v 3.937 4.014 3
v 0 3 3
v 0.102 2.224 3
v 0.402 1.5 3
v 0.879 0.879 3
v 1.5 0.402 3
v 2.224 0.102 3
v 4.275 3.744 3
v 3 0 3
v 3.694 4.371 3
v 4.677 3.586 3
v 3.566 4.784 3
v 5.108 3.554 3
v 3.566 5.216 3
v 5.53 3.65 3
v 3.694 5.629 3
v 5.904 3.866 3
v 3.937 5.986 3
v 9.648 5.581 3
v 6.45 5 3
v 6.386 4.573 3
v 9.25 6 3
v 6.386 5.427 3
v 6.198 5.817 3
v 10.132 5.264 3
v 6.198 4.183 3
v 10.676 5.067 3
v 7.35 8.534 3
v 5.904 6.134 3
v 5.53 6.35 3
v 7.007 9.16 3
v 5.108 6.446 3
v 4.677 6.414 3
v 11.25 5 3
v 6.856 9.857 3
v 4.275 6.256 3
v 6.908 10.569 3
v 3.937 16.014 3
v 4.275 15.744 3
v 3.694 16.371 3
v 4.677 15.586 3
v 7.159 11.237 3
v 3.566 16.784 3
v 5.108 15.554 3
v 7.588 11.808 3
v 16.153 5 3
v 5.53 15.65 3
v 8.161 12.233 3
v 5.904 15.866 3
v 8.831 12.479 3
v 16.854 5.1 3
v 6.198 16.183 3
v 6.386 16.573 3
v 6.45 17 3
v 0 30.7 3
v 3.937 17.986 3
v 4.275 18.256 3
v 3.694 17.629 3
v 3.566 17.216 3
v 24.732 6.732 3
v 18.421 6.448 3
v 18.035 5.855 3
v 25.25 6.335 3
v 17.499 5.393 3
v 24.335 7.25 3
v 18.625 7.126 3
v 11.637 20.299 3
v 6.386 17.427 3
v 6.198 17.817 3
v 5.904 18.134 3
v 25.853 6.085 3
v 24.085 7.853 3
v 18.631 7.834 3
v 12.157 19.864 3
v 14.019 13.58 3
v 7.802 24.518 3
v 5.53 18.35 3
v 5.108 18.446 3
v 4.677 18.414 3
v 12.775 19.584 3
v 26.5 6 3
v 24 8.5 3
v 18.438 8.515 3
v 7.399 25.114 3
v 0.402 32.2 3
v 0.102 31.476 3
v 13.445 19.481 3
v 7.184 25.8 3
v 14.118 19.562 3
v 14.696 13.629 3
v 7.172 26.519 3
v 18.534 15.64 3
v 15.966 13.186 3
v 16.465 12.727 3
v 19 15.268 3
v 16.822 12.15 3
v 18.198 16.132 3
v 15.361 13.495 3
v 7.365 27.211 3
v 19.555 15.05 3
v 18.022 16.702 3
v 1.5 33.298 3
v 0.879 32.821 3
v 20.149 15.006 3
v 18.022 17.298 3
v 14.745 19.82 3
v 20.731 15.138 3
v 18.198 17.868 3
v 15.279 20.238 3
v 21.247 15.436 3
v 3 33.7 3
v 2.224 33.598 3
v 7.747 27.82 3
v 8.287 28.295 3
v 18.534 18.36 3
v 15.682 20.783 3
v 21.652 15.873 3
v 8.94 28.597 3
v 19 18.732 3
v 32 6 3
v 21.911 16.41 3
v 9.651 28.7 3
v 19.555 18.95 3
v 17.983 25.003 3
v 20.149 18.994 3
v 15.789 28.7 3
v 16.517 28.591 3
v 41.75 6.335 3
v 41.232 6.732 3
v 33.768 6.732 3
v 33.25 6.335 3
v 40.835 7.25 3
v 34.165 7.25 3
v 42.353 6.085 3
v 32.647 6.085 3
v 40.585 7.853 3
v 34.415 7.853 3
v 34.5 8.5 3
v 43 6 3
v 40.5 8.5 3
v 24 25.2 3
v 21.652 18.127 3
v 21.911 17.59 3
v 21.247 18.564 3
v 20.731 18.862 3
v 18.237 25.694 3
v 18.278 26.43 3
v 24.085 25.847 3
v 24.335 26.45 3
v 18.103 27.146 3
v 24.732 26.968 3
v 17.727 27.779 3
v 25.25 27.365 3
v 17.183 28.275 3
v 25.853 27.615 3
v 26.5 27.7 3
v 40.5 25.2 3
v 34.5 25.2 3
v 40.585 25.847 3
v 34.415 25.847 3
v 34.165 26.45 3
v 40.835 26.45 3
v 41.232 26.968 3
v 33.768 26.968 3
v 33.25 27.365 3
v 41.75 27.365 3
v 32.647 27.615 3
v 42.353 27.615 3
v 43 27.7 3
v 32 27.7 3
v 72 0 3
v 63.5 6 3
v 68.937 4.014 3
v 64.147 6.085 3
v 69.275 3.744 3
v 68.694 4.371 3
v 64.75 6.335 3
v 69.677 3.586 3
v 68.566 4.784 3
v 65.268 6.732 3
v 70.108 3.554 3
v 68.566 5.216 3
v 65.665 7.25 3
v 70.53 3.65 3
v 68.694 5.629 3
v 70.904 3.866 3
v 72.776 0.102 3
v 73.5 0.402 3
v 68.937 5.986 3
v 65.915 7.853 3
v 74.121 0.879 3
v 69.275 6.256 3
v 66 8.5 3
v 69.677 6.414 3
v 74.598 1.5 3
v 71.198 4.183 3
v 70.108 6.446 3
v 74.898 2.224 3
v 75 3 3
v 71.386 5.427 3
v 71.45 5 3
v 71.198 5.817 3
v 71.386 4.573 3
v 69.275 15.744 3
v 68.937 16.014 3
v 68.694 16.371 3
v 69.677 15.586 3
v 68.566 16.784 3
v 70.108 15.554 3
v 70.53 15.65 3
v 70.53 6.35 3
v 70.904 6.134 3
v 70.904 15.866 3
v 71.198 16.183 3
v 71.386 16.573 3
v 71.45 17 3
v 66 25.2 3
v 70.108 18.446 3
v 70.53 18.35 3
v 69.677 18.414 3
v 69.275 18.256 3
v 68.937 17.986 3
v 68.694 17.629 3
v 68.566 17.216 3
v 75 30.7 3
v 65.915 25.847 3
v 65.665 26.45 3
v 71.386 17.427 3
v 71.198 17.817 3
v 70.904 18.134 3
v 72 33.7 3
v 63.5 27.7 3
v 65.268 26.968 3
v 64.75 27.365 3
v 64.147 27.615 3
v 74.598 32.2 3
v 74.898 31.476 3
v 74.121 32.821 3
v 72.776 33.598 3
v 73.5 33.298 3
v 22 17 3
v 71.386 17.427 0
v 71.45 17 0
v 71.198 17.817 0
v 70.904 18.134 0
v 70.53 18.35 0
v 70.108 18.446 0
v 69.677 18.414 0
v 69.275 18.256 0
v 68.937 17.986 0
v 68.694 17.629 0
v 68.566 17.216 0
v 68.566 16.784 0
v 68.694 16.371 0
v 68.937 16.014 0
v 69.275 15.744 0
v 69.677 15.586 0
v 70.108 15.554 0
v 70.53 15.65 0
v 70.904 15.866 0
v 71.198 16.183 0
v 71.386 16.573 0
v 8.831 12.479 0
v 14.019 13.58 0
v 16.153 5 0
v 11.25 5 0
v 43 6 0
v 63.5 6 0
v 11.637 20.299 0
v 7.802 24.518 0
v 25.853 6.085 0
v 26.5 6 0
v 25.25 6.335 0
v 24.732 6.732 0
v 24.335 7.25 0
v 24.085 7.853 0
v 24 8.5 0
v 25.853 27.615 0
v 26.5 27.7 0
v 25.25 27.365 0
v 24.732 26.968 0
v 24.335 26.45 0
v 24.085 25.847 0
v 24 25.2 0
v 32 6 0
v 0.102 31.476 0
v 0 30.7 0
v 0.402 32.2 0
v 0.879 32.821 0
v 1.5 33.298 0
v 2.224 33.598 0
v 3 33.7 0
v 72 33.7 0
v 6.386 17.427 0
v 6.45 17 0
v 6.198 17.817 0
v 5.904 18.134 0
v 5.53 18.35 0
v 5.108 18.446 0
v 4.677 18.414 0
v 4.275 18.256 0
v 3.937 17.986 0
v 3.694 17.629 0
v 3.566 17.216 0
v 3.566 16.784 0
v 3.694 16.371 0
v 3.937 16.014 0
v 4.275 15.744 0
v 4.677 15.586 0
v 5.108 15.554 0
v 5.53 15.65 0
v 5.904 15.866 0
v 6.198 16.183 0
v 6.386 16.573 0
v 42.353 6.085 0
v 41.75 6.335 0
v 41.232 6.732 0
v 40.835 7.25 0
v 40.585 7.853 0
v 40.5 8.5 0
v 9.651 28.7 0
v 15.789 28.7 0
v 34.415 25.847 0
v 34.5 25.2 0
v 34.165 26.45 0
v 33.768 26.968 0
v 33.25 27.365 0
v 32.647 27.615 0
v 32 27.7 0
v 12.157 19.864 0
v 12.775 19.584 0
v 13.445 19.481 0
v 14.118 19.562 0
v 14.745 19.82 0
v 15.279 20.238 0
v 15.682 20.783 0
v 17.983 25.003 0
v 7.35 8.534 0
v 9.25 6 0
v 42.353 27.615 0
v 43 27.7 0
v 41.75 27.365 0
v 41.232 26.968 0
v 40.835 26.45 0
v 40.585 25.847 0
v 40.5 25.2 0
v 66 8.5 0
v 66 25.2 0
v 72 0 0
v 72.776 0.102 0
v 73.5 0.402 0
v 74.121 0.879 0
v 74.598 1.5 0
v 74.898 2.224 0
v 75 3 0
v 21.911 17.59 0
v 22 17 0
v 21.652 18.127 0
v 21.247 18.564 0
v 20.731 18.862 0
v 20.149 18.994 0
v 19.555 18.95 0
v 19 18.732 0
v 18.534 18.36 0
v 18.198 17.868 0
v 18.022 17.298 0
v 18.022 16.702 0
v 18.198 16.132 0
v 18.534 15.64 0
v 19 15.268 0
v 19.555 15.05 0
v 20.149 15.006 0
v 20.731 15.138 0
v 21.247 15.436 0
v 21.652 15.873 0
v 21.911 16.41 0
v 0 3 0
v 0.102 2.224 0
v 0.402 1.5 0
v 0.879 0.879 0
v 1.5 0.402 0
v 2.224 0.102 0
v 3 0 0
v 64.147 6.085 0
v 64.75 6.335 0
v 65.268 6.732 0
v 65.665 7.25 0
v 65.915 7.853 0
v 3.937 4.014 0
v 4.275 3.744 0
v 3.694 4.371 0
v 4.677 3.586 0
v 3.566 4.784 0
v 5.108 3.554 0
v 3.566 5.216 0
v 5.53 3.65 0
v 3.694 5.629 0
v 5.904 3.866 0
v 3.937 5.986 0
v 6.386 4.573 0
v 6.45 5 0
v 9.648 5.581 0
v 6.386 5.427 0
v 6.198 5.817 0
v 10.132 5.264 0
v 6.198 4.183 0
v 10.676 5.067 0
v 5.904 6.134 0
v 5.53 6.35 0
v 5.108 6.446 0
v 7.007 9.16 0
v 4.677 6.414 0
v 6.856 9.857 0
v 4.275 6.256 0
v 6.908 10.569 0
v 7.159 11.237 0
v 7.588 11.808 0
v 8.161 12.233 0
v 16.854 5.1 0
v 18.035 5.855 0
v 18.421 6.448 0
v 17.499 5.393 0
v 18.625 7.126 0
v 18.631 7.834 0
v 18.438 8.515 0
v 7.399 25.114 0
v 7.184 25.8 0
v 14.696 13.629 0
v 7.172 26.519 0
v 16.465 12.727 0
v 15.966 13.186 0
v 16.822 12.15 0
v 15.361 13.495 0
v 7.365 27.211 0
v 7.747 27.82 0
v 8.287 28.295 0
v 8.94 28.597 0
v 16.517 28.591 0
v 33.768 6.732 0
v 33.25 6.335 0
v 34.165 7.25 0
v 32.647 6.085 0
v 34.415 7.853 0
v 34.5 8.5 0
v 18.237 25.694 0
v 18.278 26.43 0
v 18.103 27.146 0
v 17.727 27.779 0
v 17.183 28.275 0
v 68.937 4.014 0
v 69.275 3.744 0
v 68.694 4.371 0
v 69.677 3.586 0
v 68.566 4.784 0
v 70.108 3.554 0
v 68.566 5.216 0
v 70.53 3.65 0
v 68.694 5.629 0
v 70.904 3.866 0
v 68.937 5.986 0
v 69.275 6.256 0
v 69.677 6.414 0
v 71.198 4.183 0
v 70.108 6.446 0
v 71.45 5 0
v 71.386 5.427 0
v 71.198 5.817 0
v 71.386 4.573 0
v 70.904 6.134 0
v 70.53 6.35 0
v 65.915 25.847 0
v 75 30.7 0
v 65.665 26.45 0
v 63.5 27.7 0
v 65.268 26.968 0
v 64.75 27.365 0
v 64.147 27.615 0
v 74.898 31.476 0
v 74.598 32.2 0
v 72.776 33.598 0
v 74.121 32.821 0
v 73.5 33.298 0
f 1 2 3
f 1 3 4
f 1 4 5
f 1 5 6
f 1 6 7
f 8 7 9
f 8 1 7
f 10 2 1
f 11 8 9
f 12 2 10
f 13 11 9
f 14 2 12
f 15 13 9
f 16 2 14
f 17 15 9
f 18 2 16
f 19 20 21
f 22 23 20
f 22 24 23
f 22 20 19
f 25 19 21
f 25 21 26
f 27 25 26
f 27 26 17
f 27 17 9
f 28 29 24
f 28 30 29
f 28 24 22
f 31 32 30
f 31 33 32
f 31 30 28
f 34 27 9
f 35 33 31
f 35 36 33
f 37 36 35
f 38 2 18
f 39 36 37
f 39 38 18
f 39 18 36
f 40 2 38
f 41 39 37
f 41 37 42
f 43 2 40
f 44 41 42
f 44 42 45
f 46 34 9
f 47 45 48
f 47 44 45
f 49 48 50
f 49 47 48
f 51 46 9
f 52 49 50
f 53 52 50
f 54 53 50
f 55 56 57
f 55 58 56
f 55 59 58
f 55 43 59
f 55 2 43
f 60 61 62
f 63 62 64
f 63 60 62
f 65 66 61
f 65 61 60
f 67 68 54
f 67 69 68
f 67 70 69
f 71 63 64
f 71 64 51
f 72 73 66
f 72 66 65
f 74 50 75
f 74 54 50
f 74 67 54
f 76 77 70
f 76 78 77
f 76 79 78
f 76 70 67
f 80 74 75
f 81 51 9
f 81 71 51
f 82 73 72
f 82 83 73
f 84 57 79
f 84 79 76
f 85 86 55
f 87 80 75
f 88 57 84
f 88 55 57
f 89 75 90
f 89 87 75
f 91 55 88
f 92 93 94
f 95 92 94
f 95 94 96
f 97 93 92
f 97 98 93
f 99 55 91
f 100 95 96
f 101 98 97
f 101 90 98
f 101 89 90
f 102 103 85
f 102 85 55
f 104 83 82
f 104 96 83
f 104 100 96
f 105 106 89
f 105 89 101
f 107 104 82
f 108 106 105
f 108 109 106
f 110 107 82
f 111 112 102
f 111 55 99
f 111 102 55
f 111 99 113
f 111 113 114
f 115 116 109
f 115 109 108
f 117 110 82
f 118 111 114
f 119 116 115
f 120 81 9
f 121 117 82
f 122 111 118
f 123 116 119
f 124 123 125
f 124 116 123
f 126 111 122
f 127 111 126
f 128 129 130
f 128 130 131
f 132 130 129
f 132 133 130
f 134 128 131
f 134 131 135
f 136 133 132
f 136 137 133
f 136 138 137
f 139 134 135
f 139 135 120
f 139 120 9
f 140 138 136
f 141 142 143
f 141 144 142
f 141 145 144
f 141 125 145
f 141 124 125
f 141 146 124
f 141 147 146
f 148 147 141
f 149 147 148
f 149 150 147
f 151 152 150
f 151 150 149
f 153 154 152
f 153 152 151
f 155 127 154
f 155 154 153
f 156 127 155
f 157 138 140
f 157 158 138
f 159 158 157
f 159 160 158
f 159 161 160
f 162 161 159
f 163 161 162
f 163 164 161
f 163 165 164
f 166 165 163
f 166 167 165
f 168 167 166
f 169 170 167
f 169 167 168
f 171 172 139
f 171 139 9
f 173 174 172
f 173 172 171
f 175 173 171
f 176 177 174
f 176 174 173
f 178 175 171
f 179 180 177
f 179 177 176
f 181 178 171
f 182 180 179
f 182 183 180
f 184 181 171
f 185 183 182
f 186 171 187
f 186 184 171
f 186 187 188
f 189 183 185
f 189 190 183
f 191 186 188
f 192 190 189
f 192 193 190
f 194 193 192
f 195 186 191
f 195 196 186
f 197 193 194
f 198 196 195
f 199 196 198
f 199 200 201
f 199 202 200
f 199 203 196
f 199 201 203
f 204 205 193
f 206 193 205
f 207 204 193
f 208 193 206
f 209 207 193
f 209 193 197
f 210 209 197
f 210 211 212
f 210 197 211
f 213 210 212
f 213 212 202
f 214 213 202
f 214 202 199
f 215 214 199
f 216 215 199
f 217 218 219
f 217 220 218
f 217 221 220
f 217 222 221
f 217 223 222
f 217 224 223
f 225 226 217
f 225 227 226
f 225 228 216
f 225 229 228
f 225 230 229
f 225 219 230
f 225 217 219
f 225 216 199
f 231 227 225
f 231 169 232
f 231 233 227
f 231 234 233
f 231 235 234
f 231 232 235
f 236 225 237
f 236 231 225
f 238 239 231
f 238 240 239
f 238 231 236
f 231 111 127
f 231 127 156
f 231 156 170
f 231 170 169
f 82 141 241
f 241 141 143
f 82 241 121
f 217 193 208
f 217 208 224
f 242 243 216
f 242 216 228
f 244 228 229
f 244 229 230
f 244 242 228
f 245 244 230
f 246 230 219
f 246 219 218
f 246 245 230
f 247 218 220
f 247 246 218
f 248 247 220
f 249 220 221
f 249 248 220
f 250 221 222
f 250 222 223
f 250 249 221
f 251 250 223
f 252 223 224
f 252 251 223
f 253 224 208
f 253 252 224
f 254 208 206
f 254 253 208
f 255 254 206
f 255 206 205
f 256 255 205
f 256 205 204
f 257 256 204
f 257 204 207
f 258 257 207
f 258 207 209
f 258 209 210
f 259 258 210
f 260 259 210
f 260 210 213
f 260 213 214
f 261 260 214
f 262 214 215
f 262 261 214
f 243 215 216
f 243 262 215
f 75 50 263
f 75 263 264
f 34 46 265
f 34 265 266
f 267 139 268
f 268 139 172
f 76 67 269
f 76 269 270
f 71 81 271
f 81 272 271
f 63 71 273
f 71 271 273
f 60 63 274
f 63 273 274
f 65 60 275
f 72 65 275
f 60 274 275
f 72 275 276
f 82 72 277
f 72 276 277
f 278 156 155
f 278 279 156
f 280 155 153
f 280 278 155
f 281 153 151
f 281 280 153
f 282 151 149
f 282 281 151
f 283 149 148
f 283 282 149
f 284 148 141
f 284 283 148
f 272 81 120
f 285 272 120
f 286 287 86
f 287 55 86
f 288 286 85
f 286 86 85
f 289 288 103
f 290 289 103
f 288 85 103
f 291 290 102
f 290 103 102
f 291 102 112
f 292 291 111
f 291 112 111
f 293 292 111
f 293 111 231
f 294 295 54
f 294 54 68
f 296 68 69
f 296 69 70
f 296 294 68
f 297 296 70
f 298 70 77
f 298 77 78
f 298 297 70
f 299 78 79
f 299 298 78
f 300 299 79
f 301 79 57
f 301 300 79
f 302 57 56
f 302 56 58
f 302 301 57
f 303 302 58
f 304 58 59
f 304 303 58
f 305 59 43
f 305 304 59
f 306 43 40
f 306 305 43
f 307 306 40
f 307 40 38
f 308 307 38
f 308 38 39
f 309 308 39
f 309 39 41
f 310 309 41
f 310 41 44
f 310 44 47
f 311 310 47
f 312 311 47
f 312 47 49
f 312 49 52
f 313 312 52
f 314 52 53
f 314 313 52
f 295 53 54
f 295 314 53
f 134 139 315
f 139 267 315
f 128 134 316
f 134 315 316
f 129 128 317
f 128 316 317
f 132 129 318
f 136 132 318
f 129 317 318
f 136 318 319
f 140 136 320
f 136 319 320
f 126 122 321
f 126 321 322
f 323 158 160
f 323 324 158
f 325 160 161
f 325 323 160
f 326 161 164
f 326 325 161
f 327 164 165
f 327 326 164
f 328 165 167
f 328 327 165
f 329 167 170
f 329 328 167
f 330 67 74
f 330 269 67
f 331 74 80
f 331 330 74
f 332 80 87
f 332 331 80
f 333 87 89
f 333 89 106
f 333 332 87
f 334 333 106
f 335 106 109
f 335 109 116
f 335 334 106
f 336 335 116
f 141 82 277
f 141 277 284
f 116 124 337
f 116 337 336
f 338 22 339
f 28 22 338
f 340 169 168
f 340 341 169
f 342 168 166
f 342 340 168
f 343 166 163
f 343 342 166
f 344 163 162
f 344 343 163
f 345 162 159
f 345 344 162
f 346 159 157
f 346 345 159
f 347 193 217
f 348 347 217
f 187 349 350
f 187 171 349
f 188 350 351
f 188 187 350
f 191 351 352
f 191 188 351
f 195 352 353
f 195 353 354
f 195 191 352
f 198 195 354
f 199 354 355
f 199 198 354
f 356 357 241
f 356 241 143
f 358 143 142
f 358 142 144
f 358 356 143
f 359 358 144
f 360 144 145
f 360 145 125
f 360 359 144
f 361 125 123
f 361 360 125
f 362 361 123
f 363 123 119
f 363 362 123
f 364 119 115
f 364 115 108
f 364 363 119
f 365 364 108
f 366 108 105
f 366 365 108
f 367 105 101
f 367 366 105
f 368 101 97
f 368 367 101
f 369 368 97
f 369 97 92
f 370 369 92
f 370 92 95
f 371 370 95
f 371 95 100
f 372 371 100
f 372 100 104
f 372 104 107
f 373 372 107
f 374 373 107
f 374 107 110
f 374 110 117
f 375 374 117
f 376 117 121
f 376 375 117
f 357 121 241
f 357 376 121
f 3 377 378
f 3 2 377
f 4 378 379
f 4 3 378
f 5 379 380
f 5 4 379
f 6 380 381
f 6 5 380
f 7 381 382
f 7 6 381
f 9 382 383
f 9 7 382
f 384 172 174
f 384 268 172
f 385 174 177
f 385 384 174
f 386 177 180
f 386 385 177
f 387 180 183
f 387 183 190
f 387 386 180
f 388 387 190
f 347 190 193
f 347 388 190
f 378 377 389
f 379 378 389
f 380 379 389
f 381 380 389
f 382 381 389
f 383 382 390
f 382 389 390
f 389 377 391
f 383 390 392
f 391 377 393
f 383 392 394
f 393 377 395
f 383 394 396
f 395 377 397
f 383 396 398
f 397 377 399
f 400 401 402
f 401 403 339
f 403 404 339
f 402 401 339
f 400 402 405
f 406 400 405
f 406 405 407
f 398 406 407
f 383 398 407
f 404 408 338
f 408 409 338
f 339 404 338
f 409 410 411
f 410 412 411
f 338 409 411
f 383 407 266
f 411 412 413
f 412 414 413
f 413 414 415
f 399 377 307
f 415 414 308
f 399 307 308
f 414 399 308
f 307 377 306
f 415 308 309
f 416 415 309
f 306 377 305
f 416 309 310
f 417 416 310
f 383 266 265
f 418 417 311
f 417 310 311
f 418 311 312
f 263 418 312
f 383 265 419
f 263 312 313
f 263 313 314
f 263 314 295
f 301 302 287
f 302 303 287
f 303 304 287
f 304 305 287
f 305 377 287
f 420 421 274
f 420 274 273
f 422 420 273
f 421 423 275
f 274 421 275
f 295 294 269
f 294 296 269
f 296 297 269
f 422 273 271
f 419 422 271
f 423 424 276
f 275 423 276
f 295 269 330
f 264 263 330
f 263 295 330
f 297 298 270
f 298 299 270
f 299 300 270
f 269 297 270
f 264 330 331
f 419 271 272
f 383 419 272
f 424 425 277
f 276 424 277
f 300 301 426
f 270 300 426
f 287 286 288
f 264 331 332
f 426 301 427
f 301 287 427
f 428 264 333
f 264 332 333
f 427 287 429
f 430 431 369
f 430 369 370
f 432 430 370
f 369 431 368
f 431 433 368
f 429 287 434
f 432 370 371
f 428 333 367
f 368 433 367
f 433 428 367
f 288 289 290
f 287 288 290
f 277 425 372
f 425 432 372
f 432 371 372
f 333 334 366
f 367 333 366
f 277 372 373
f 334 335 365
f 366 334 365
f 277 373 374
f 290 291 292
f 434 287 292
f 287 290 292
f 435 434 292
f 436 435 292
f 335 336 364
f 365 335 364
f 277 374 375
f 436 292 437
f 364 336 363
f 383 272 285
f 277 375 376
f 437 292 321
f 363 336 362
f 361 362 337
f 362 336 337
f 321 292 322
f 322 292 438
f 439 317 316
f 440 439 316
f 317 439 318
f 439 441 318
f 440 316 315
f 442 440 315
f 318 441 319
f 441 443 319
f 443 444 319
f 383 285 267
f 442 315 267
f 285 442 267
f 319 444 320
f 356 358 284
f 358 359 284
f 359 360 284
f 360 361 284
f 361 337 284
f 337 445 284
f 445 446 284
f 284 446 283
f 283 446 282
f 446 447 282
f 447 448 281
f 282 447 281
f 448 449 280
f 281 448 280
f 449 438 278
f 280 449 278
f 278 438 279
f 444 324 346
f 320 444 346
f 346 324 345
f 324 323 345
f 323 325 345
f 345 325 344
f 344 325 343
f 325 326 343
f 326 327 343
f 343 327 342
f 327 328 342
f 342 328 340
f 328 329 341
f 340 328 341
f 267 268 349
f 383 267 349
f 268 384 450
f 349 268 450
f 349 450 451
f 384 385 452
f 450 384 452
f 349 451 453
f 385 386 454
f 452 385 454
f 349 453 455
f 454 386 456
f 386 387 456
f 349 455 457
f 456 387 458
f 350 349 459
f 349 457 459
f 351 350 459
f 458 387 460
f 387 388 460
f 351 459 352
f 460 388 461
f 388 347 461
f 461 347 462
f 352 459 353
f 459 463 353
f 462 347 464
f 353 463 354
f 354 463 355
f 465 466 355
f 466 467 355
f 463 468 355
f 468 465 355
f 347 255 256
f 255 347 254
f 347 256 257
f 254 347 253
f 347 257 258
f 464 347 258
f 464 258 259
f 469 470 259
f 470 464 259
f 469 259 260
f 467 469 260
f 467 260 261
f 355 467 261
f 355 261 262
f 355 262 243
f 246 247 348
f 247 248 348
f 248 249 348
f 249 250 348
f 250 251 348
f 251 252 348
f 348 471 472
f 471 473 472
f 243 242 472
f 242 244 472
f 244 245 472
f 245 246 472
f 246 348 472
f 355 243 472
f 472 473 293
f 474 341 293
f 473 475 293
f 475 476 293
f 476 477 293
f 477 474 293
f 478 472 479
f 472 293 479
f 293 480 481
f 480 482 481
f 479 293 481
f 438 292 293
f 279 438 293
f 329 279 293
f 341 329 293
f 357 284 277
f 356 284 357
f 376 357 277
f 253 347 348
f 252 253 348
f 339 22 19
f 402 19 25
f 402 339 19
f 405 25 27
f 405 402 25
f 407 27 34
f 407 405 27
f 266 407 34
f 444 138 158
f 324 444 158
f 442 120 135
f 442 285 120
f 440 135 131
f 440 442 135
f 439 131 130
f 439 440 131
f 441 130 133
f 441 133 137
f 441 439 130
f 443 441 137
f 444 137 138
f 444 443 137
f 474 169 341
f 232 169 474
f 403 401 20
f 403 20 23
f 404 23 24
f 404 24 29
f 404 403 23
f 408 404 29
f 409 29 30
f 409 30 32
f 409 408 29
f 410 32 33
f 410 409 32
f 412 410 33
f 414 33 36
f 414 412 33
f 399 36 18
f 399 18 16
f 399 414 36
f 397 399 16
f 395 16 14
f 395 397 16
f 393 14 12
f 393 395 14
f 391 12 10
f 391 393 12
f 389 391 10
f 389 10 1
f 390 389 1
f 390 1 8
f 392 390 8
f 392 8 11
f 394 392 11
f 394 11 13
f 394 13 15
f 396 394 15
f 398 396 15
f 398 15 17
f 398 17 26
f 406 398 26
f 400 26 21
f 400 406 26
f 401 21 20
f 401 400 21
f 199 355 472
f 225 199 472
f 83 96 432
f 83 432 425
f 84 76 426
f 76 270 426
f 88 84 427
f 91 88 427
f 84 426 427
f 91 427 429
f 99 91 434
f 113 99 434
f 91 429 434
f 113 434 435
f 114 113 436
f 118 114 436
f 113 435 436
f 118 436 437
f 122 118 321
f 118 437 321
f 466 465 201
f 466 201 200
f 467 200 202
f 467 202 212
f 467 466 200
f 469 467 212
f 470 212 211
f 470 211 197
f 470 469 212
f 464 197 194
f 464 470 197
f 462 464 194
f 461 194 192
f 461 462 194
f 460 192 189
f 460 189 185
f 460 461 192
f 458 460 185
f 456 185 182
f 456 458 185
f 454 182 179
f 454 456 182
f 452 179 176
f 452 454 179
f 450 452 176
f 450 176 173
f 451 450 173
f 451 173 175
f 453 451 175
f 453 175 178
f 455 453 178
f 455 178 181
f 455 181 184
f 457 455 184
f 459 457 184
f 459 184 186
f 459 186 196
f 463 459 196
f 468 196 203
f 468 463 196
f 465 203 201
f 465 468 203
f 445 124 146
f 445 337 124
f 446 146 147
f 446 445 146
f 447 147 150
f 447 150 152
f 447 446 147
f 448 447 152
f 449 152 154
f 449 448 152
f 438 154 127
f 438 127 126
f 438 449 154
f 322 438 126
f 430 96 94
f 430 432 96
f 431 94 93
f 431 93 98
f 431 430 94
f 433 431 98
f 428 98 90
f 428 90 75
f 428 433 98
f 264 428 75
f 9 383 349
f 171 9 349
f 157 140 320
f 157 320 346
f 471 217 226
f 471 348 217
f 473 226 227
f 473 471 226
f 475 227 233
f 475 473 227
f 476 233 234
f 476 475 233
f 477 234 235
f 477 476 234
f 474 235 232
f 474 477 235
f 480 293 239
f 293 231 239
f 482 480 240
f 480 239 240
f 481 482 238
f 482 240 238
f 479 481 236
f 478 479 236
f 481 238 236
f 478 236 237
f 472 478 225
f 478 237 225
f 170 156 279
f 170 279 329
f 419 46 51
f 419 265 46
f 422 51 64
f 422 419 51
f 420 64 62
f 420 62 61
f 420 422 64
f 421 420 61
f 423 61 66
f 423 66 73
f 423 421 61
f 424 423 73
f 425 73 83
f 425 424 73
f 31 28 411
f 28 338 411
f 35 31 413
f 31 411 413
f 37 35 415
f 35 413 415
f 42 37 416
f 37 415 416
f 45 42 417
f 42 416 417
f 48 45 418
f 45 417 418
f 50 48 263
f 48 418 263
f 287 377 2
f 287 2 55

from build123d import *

# Parameters (mm, degrees)
SKETCH_1_W          = 75
SKETCH_1_H          = 33.7
SKETCH_1_R          = 1.45
SKETCH_1_R_2        = 2
EXTRUDE_1_DEPTH     = 3
SKETCH_2_W          = 25.5
SKETCH_2_H          = 21.7
SKETCH_2_W_2        = 10.5
CUT_EXTRUDE_1_DEPTH = 10
FILLET_1_R          = 2.5
FILLET_2_R          = 3


with BuildPart() as part:
    # 草图1 → 凸台-拉伸1 (new body)
    with BuildSketch(Plane.XY):
        with Locations((37.5, 16.85)):
            Rectangle(SKETCH_1_W, SKETCH_1_H)
        with Locations((5, 17)):
            Circle(SKETCH_1_R, mode=Mode.SUBTRACT)
        with Locations((5, 5)):
            Circle(SKETCH_1_R, mode=Mode.SUBTRACT)
        with Locations((70, 17)):
            Circle(SKETCH_1_R, mode=Mode.SUBTRACT)
        with Locations((70, 5)):
            Circle(SKETCH_1_R, mode=Mode.SUBTRACT)
        with Locations((20, 17)):
            Circle(SKETCH_1_R_2, mode=Mode.SUBTRACT)
    extrude(amount=EXTRUDE_1_DEPTH)

    # 草图2 → 切除-拉伸1 (cut)
    with BuildSketch(Plane.XY.offset(3)):
        Polygon((4, 28.7), (20, 28.7), (14, 17.7), align=None)
        with Locations((53.25, 16.85)):
            Rectangle(SKETCH_2_W, SKETCH_2_H)
        with Locations((29.25, 16.85)):
            Rectangle(SKETCH_2_W_2, SKETCH_2_H)
        Polygon((5, 11.666666667), (16, 14), (20, 5), (10, 5), align=None)
    extrude(amount=-CUT_EXTRUDE_1_DEPTH, mode=Mode.SUBTRACT)

    # 圆角1
    fillet_1_edges = [part.edges().sort_by_distance(p)[0] for p in [
        (40.5, 6, 1.5),
        (40.5, 27.7, 1.5),
        (66, 27.7, 1.5),
        (66, 6, 1.5),
        (10, 5, 1.5),
        (5, 11.666666667, 1.5),
        (16, 14, 1.5),
        (20, 5, 1.5),
        (14, 17.7, 1.5),
        (4, 28.7, 1.5),
        (20, 28.7, 1.5),
        (24, 6, 1.5),
        (24, 27.7, 1.5),
        (34.5, 27.7, 1.5),
        (34.5, 6, 1.5),
    ]]
    fillet(fillet_1_edges, radius=FILLET_1_R)

    # 圆角2
    fillet_2_edges = [part.edges().sort_by_distance(p)[0] for p in [
        (0, 33.7, 1.5),
        (75, 33.7, 1.5),
        (75, 0, 1.5),
        (0, 0, 1.5),
    ]]
    fillet(fillet_2_edges, radius=FILLET_2_R)


solid = part.part
